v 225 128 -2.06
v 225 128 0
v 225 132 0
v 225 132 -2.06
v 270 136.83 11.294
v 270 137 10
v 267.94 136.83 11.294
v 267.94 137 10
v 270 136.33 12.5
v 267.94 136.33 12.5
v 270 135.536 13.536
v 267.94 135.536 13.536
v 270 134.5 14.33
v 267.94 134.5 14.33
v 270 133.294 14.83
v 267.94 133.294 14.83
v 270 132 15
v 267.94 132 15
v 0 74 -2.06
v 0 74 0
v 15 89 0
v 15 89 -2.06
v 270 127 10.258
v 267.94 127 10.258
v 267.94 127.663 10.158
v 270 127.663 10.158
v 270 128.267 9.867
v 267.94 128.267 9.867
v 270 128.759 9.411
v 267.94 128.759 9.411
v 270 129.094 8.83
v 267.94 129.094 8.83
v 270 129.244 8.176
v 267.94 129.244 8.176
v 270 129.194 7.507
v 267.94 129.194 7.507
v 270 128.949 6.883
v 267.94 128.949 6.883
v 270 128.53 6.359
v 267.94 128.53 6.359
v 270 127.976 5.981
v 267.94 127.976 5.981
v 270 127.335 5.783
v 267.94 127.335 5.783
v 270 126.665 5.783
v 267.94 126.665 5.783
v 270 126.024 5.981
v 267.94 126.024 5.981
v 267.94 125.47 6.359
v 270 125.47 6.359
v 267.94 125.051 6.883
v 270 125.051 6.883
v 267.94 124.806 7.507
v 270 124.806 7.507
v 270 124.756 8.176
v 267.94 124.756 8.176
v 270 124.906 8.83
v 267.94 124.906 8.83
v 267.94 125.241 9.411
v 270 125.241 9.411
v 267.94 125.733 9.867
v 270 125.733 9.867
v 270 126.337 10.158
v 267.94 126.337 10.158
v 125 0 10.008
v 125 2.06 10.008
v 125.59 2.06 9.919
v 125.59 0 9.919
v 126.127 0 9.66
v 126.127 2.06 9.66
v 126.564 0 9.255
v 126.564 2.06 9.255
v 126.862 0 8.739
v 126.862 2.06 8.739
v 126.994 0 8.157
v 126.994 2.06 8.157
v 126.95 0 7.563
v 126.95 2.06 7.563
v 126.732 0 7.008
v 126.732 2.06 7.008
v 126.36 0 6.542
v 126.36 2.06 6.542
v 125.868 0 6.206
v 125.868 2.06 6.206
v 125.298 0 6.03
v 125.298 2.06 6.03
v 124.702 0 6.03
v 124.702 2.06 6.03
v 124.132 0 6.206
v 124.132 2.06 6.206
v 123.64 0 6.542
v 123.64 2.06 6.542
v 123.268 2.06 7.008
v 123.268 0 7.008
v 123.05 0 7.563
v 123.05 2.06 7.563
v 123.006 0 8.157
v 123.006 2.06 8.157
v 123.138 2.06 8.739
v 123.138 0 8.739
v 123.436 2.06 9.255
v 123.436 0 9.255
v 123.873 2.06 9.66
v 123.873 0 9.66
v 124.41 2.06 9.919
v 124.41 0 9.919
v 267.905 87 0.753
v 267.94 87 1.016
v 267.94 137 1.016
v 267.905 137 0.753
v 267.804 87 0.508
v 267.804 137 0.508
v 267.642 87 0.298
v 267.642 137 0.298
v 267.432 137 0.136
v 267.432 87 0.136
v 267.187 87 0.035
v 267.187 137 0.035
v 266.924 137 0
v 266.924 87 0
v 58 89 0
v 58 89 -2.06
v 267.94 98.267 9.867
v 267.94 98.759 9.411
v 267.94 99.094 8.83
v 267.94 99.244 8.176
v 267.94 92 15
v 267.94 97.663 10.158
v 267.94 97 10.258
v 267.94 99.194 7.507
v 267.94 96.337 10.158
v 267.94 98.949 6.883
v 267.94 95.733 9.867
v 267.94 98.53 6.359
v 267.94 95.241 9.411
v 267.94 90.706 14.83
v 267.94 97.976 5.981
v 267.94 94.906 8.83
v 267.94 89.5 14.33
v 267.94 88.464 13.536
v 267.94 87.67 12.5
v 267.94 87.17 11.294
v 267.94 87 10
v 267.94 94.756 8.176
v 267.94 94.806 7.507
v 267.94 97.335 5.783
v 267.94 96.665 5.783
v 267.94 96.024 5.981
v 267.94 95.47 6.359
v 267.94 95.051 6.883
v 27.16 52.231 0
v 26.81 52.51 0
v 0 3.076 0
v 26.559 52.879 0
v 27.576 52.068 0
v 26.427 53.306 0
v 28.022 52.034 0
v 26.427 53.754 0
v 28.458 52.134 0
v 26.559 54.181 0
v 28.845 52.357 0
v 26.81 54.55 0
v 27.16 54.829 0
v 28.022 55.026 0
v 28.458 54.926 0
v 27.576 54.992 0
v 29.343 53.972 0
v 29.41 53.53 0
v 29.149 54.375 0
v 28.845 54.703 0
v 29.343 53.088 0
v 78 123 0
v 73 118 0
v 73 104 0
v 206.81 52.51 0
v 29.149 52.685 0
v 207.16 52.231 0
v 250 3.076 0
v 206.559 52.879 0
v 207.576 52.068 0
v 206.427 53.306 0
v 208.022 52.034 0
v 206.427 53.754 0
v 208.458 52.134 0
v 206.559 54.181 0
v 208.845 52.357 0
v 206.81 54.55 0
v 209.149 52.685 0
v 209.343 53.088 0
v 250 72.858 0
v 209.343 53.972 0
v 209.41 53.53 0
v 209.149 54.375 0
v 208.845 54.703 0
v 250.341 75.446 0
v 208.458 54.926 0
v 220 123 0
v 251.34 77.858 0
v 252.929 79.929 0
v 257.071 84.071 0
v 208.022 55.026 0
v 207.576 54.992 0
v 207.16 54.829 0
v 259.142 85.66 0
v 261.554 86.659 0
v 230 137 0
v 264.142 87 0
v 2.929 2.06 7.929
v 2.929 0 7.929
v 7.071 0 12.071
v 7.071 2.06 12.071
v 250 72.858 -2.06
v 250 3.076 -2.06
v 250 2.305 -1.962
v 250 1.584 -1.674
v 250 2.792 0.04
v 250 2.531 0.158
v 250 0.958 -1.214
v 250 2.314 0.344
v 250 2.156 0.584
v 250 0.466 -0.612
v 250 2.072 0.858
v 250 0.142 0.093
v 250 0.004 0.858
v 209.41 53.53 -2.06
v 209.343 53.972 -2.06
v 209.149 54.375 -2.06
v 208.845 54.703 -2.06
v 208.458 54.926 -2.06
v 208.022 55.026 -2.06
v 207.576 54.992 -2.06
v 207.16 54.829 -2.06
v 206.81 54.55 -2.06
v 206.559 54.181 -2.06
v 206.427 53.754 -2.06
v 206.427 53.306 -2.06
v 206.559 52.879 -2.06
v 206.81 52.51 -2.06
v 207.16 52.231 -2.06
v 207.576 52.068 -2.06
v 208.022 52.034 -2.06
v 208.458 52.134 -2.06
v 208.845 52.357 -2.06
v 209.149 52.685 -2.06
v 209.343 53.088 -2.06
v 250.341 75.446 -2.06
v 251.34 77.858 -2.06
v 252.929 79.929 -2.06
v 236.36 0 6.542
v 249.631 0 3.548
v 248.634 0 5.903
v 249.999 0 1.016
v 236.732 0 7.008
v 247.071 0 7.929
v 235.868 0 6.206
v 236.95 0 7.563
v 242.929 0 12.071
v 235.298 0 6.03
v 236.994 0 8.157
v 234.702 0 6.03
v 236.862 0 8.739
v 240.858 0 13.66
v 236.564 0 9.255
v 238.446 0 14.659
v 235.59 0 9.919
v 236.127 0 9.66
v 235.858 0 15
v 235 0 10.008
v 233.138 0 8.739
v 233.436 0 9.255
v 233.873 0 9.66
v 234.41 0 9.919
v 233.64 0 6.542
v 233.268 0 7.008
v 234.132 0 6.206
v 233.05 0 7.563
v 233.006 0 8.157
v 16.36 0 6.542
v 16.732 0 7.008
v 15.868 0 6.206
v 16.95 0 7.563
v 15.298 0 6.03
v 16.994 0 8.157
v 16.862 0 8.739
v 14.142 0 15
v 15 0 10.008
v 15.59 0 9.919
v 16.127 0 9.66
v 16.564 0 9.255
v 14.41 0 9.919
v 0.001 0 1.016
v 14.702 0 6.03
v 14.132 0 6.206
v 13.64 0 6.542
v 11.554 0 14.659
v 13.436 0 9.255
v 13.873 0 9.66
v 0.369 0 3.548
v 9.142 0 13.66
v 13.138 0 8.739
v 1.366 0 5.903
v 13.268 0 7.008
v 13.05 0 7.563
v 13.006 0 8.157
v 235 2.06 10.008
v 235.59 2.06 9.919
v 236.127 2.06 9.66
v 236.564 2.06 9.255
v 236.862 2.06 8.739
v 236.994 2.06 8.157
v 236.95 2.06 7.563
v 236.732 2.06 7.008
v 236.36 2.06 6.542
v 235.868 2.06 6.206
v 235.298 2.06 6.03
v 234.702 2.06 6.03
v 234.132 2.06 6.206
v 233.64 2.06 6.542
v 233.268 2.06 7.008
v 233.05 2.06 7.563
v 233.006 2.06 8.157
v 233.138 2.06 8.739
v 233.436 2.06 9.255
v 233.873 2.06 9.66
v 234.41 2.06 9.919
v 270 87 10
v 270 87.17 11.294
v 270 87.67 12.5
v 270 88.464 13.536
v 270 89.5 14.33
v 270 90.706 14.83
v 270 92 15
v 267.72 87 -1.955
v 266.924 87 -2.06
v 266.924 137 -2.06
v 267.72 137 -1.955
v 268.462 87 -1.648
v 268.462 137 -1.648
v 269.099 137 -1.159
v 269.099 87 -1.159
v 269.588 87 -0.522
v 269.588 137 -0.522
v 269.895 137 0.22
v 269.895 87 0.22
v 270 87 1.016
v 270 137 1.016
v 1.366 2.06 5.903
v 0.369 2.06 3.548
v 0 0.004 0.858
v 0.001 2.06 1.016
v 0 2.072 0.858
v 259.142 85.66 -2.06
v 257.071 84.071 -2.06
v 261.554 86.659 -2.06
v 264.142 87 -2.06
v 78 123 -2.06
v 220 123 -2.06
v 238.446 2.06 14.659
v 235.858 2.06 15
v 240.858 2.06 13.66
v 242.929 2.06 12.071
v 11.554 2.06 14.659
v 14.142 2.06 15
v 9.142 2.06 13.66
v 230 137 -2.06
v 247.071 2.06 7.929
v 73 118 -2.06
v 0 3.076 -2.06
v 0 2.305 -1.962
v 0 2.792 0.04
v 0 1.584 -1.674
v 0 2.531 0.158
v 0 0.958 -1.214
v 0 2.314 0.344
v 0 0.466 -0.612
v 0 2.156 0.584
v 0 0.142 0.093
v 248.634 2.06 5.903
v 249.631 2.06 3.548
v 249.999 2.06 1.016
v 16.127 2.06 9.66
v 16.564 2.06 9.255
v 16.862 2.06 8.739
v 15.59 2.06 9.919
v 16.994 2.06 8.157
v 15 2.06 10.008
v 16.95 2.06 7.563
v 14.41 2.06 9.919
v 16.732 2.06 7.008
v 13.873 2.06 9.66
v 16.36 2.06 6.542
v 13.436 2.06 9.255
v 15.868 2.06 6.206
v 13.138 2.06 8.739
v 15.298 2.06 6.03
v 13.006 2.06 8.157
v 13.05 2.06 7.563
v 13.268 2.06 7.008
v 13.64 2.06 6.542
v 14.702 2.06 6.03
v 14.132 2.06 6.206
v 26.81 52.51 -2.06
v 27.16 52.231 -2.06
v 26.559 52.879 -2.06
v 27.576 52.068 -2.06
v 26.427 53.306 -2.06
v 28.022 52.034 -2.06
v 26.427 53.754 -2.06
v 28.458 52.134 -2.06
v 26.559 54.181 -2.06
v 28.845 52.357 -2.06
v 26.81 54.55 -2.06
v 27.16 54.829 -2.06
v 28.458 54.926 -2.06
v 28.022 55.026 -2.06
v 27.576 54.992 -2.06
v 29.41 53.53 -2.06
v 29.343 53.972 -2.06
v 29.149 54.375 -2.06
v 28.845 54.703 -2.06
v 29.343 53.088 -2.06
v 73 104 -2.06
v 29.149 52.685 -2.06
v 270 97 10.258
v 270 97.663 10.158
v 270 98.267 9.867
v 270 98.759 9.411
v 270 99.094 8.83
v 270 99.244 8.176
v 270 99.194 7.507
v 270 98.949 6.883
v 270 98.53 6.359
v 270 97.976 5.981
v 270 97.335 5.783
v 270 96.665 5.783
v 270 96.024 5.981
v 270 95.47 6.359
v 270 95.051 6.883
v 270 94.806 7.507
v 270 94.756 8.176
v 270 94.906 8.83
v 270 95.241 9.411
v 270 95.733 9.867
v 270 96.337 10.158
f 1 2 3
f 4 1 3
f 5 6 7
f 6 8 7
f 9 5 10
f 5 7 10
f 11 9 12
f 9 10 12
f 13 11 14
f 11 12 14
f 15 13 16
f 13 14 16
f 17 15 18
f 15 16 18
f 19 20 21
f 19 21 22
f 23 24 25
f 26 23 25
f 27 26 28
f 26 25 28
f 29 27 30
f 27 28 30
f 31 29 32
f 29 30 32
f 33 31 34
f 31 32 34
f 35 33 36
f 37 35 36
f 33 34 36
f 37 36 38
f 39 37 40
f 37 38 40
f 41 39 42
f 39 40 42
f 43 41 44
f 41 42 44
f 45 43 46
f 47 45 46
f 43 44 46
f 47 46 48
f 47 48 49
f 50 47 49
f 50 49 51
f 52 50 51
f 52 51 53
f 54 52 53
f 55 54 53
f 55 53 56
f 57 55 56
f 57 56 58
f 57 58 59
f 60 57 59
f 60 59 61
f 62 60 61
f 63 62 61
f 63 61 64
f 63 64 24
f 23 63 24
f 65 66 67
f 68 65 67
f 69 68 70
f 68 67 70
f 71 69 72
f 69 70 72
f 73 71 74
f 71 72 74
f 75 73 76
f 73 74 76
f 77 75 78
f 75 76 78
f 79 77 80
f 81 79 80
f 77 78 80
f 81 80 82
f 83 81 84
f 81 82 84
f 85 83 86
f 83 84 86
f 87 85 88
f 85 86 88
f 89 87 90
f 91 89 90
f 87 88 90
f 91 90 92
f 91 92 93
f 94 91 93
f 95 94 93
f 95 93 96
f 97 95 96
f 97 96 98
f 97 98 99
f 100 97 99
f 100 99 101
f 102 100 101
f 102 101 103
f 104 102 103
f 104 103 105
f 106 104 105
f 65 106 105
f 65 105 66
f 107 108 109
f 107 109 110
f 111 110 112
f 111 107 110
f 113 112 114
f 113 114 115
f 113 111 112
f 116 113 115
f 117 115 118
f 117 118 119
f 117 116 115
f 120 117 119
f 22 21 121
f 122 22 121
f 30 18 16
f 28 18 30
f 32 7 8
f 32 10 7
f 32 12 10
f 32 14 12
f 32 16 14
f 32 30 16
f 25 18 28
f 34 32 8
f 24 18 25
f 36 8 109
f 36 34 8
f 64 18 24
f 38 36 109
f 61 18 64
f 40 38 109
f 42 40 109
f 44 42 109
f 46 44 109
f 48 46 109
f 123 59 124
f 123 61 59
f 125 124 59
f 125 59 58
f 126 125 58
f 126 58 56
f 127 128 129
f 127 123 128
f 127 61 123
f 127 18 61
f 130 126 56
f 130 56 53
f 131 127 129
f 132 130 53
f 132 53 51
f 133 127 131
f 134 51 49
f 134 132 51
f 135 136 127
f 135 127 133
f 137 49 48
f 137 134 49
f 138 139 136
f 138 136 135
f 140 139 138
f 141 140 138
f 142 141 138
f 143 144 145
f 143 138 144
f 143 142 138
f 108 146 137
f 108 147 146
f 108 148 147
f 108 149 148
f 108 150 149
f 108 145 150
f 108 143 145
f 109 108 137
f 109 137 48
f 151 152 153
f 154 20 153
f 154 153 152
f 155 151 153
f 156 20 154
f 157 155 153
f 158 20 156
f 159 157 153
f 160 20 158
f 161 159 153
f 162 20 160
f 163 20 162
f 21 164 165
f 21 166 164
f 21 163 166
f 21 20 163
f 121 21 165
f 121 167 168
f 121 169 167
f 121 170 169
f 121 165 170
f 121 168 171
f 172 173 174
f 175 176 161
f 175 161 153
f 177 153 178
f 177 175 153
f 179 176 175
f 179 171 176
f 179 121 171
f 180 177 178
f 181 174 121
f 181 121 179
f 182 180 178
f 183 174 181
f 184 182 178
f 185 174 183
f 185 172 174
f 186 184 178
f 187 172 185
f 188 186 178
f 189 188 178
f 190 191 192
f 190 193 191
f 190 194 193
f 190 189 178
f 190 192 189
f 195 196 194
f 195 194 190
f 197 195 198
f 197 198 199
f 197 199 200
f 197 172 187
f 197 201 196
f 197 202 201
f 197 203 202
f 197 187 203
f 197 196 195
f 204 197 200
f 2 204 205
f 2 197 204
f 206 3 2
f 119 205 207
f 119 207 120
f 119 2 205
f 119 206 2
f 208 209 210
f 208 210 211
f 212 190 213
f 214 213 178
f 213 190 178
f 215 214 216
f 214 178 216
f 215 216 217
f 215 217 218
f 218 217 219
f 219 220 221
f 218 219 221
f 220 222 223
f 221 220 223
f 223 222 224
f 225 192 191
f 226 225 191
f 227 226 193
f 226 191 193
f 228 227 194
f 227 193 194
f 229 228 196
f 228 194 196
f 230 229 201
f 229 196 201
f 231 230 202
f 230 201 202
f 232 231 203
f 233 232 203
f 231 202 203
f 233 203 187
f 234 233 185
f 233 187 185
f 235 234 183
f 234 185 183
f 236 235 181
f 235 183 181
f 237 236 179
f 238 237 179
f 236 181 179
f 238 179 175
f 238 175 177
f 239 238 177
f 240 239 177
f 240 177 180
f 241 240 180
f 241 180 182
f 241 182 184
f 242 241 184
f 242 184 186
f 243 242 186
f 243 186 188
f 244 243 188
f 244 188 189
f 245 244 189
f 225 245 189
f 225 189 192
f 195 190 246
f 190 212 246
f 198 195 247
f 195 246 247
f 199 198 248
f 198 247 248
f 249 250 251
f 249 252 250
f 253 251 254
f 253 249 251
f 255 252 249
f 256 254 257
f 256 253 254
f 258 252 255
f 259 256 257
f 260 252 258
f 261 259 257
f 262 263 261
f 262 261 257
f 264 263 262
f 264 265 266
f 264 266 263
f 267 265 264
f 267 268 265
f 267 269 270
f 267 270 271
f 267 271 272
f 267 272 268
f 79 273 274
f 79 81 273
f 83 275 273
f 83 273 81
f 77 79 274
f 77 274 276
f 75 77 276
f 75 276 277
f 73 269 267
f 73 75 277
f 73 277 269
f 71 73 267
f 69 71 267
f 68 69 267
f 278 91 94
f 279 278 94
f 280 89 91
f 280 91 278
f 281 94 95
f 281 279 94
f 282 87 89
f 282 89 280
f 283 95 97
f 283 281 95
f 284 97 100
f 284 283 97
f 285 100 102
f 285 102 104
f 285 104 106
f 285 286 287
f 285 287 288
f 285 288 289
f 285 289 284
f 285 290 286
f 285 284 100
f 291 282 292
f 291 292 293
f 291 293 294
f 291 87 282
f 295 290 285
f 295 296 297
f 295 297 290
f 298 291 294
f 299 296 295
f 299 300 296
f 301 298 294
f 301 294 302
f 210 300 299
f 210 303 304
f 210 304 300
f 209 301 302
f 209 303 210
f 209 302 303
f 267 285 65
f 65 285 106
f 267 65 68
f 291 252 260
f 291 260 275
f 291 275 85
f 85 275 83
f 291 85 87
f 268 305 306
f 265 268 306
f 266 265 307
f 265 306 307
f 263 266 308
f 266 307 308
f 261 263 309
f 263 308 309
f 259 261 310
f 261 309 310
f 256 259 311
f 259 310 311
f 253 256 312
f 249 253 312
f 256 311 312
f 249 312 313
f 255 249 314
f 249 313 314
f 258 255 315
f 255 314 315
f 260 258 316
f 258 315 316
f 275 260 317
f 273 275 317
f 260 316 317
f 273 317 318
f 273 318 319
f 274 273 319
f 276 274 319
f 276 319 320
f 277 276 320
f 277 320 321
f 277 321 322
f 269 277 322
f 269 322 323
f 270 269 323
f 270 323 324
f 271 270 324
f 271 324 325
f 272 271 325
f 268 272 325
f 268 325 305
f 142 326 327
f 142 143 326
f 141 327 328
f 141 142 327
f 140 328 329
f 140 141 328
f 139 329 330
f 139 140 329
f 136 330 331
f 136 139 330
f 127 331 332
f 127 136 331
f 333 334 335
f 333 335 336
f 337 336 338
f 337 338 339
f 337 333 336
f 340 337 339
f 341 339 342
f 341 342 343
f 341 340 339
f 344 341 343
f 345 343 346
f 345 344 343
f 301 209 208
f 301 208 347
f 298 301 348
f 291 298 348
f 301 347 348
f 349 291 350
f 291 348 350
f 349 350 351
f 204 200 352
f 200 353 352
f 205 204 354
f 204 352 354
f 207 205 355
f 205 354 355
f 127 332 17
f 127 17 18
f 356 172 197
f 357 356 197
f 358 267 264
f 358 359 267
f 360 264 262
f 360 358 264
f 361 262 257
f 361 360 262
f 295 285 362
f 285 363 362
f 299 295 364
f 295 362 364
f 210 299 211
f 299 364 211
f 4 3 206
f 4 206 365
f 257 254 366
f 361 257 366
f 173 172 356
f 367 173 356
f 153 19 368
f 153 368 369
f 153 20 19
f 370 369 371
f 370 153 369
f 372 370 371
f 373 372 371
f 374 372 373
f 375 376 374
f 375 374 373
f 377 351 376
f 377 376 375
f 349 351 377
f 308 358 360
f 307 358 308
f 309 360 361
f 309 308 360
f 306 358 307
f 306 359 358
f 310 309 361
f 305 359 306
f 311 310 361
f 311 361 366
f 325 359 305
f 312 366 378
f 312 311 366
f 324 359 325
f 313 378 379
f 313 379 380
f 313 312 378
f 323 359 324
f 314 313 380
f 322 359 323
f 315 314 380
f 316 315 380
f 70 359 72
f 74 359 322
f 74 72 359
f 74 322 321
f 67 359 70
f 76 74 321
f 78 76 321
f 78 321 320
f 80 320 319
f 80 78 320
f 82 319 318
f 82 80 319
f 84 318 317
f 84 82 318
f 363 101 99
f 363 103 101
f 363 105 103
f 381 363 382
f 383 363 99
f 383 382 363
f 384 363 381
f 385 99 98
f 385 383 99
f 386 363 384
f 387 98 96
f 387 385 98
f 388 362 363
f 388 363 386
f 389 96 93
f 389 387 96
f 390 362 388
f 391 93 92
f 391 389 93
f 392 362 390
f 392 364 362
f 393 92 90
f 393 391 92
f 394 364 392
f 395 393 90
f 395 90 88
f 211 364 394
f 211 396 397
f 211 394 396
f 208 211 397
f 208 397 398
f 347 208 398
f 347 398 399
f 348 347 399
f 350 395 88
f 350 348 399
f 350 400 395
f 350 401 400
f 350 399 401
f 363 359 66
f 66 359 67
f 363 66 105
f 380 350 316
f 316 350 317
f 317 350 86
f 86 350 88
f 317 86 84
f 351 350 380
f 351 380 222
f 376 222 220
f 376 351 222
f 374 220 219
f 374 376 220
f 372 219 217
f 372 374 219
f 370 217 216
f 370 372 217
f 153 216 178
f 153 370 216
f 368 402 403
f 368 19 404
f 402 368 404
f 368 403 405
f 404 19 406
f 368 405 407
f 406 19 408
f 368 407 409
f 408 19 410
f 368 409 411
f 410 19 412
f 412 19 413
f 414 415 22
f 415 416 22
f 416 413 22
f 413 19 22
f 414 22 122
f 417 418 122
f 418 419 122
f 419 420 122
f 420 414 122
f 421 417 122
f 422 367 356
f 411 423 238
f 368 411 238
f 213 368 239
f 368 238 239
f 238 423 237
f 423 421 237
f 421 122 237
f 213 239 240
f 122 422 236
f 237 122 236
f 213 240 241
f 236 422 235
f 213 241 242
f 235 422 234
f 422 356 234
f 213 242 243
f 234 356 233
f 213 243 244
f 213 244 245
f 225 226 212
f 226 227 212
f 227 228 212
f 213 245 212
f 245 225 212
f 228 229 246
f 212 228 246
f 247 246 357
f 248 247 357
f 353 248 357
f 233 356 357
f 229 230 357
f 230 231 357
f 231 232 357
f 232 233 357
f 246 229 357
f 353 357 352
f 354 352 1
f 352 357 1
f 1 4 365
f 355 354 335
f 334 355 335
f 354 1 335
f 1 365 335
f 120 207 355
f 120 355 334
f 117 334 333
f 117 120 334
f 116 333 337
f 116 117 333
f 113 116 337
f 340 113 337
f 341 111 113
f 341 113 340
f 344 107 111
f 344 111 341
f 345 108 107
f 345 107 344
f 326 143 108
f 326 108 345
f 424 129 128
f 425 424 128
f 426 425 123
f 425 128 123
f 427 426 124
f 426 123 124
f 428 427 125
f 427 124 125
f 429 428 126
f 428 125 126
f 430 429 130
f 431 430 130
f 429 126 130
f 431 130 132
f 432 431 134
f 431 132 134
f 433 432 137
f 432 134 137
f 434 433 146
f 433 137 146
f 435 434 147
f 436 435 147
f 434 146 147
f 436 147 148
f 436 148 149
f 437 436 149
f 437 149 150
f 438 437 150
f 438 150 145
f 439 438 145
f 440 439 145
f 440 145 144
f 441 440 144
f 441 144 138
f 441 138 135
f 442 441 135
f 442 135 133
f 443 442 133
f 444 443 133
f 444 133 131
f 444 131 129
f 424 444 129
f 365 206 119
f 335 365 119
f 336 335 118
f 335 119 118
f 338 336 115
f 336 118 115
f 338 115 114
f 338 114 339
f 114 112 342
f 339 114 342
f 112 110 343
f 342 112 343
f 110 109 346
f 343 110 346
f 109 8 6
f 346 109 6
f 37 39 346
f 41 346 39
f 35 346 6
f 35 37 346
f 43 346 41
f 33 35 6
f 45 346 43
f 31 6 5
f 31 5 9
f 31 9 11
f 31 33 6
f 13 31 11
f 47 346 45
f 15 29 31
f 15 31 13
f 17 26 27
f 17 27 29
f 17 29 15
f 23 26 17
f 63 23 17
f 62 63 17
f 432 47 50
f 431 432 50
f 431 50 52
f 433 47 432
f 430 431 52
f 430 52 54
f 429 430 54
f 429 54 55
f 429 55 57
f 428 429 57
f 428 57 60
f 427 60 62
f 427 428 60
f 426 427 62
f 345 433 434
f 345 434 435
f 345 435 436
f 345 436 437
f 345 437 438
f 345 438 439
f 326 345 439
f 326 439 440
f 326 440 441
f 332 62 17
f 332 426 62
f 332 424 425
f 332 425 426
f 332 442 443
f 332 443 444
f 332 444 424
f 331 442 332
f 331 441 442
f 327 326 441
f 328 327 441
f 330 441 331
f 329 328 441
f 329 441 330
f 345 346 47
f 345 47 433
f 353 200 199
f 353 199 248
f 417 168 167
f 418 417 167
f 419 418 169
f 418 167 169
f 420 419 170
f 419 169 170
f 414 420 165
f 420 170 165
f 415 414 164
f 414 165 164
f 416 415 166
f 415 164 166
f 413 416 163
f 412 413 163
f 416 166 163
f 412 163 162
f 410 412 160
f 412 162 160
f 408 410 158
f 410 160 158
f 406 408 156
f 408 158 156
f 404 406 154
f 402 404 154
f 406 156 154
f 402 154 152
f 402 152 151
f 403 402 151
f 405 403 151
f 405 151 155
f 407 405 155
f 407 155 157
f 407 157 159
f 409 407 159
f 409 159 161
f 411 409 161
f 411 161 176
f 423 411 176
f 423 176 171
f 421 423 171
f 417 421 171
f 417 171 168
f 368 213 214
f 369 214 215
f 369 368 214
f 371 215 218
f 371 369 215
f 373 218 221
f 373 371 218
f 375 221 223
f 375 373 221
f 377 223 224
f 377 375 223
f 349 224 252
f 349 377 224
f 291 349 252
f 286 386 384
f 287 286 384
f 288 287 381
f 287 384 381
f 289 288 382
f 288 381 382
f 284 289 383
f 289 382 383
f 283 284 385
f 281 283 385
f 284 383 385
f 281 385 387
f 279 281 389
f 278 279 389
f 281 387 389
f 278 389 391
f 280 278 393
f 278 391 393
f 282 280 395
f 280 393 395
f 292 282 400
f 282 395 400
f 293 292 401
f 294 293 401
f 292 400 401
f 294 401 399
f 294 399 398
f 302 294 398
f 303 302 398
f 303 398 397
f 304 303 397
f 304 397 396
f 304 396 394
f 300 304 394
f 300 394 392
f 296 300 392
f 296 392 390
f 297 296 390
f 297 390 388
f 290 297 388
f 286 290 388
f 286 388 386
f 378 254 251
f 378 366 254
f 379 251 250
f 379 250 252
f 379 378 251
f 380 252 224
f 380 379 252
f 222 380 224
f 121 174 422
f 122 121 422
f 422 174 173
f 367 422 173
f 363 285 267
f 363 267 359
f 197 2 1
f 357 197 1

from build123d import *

# Parameters (mm, degrees)
SKETCH1_W                    = 250
SKETCH1_H                    = 153
BASE_FLANGE1_DEPTH           = 2.06
EDGE_FLANGE1_STRIP_W         = 10.272
EDGE_FLANGE1_STRIP_H         = 2.06
EDGE_FLANGE1_STRIP_CUT_DEPTH = 250
EDGE_FLANGE1_DEPTH           = 250
EDGE_FLANGE2_DEPTH           = 50
CHAMFER1_SIZE                = 10
SKETCH13_R                   = 2
CUT_EXTRUDE2_DEPTH           = 8.4
SKETCH14_R                   = 2.25
CUT_EXTRUDE3_DEPTH           = 8.4
SKETCH20_W                   = 73
SKETCH20_H                   = 64
CUT_EXTRUDE9_DEPTH           = 10
FILLET1_R                    = 10
CHAMFER3_SIZE                = 15
CHAMFER4_SIZE                = 15
SKETCH21_R                   = 1.5
CUT_EXTRUDE10_DEPTH          = 10
FILLET2_R                    = 5
CUT_EXTRUDE11_DEPTH          = 10
CHAMFER5_SIZE                = 5


# Sheet-metal steps are written as plain solids
with BuildPart() as part:
    # Sketch1 → Base-Flange1 (new body)
    with BuildSketch(Plane.XY):
        with Locations((125, 76.5)):
            Rectangle(SKETCH1_W, SKETCH1_H)
    extrude(amount=-BASE_FLANGE1_DEPTH)

    # Edge-Flange1 strip (across the edge) → Edge-Flange1 strip cut (cut)
    with BuildSketch(Plane.YZ):
        with Locations((-2.06, -1.03)):
            Rectangle(EDGE_FLANGE1_STRIP_W, EDGE_FLANGE1_STRIP_H)
    extrude(amount=EDGE_FLANGE1_STRIP_CUT_DEPTH, mode=Mode.SUBTRACT)

    # Edge-Flange1 section (across the edge) → Edge-Flange1 (add)
    with BuildSketch(Plane.YZ):
        with BuildLine():
            Line((0, 1.016), (0, 15))
            Line((0, 15), (2.06, 15))
            Line((2.06, 15), (2.06, 1.016))
            ThreePointArc((2.06, 1.016), (2.35757951, 0.29757951), (3.076, 0))
            Line((3.076, 0), (3.076, -2.06))
            ThreePointArc((3.076, -2.06), (0.900939541, -1.159060459), (0, 1.016))
        make_face()
    extrude(amount=EDGE_FLANGE1_DEPTH)

    # Edge-Flange2 section (across the edge) → Edge-Flange2 (add)
    with BuildSketch(Plane(origin=(270, 87, 0), x_dir=(-1, 0, 0), z_dir=(0, 1, 0))):
        with BuildLine():
            Line((0, 1.016), (0, 15))
            Line((0, 15), (2.06, 15))
            Line((2.06, 15), (2.06, 1.016))
            ThreePointArc((2.06, 1.016), (2.35757951, 0.29757951), (3.076, 0))
            Line((3.076, 0), (20, 0))
            Line((20, 0), (20, -2.06))
            Line((20, -2.06), (3.076, -2.06))
            ThreePointArc((3.076, -2.06), (0.900939541, -1.159060459), (0, 1.016))
        make_face()
    extrude(amount=EDGE_FLANGE2_DEPTH)

    # Chamfer1
    chamfer1_edges = [part.edges().sort_by_distance(p)[0] for p in [
        (0, 1.03, 15),
        (250, 1.03, 15),
        (250, 87, -1.03),
        (250, 153, -1.03),
    ]]
    chamfer(chamfer1_edges, length=CHAMFER1_SIZE)

    # Sketch13 → Cut-Extrude2 (cut)
    with BuildSketch(Plane(origin=(0, 2.06, 0), x_dir=(1, 0, 0), z_dir=(0, 1, 0))):
        with Locations(Location((125, -8.008, 0), (0, 0, 270))):
            Circle(SKETCH13_R)
        with Locations(Location((235, -8.008, 0), (0, 0, 270))):
            Circle(SKETCH13_R)
        with Locations(Location((15, -8.008, 0), (0, 0, 270))):
            Circle(SKETCH13_R)
    extrude(amount=-CUT_EXTRUDE2_DEPTH, mode=Mode.SUBTRACT)

    # Sketch14 → Cut-Extrude3 (cut)
    with BuildSketch(Plane.ZY.offset(-267.94)):
        with Locations((8.008, 127)):
            Circle(SKETCH14_R)
        with Locations((8.008, 97)):
            Circle(SKETCH14_R)
    extrude(amount=-CUT_EXTRUDE3_DEPTH, mode=Mode.SUBTRACT)

    # Sketch20 → Cut-Extrude9 (cut)
    with BuildSketch(Plane.XY):
        with Locations((36.5, 121)):
            Rectangle(SKETCH20_W, SKETCH20_H)
    extrude(amount=-CUT_EXTRUDE9_DEPTH, mode=Mode.SUBTRACT)

    # Fillet1
    fillet1_edges = [part.edges().sort_by_distance(p)[0] for p in [
        (250, 1.03, 5),
        (240, 1.03, 15),
        (10, 1.03, 15),
        (0, 1.03, 5),
        (250, 77, -1.03),
        (260, 87, -1.03),
    ]]
    fillet(fillet1_edges, radius=FILLET1_R)

    # Chamfer3
    chamfer3_edges = [part.edges().sort_by_distance(p)[0] for p in [
        (0, 89, -1.03),
    ]]
    chamfer(chamfer3_edges, length=CHAMFER3_SIZE)

    # Chamfer4
    chamfer4_edges = [part.edges().sort_by_distance(p)[0] for p in [
        (73, 89, -1.03),
    ]]
    chamfer(chamfer4_edges, length=CHAMFER4_SIZE)

    # Sketch21 → Cut-Extrude10 (cut)
    with BuildSketch(Plane.XY):
        with Locations((27.91, 53.53)):
            Circle(SKETCH21_R)
        with Locations((207.91, 53.53)):
            Circle(SKETCH21_R)
    extrude(amount=-CUT_EXTRUDE10_DEPTH, mode=Mode.SUBTRACT)

    # Fillet2
    fillet2_edges = [part.edges().sort_by_distance(p)[0] for p in [
        (268.97, 87, 15),
        (268.97, 137, 15),
    ]]
    fillet(fillet2_edges, radius=FILLET2_R)

    # Sketch22 → Cut-Extrude11 (cut)
    with BuildSketch(Plane.XY):
        Polygon((250, 137), (250, 143), (240, 153), (73, 153), (73, 123), (225, 123), (225, 137), align=None)
    extrude(amount=-CUT_EXTRUDE11_DEPTH, mode=Mode.SUBTRACT)

    # Chamfer5
    chamfer5_edges = [part.edges().sort_by_distance(p)[0] for p in [
        (225, 137, -1.03),
        (225, 123, -1.03),
        (73, 123, -1.03),
    ]]
    chamfer(chamfer5_edges, length=CHAMFER5_SIZE)


solid = part.part
